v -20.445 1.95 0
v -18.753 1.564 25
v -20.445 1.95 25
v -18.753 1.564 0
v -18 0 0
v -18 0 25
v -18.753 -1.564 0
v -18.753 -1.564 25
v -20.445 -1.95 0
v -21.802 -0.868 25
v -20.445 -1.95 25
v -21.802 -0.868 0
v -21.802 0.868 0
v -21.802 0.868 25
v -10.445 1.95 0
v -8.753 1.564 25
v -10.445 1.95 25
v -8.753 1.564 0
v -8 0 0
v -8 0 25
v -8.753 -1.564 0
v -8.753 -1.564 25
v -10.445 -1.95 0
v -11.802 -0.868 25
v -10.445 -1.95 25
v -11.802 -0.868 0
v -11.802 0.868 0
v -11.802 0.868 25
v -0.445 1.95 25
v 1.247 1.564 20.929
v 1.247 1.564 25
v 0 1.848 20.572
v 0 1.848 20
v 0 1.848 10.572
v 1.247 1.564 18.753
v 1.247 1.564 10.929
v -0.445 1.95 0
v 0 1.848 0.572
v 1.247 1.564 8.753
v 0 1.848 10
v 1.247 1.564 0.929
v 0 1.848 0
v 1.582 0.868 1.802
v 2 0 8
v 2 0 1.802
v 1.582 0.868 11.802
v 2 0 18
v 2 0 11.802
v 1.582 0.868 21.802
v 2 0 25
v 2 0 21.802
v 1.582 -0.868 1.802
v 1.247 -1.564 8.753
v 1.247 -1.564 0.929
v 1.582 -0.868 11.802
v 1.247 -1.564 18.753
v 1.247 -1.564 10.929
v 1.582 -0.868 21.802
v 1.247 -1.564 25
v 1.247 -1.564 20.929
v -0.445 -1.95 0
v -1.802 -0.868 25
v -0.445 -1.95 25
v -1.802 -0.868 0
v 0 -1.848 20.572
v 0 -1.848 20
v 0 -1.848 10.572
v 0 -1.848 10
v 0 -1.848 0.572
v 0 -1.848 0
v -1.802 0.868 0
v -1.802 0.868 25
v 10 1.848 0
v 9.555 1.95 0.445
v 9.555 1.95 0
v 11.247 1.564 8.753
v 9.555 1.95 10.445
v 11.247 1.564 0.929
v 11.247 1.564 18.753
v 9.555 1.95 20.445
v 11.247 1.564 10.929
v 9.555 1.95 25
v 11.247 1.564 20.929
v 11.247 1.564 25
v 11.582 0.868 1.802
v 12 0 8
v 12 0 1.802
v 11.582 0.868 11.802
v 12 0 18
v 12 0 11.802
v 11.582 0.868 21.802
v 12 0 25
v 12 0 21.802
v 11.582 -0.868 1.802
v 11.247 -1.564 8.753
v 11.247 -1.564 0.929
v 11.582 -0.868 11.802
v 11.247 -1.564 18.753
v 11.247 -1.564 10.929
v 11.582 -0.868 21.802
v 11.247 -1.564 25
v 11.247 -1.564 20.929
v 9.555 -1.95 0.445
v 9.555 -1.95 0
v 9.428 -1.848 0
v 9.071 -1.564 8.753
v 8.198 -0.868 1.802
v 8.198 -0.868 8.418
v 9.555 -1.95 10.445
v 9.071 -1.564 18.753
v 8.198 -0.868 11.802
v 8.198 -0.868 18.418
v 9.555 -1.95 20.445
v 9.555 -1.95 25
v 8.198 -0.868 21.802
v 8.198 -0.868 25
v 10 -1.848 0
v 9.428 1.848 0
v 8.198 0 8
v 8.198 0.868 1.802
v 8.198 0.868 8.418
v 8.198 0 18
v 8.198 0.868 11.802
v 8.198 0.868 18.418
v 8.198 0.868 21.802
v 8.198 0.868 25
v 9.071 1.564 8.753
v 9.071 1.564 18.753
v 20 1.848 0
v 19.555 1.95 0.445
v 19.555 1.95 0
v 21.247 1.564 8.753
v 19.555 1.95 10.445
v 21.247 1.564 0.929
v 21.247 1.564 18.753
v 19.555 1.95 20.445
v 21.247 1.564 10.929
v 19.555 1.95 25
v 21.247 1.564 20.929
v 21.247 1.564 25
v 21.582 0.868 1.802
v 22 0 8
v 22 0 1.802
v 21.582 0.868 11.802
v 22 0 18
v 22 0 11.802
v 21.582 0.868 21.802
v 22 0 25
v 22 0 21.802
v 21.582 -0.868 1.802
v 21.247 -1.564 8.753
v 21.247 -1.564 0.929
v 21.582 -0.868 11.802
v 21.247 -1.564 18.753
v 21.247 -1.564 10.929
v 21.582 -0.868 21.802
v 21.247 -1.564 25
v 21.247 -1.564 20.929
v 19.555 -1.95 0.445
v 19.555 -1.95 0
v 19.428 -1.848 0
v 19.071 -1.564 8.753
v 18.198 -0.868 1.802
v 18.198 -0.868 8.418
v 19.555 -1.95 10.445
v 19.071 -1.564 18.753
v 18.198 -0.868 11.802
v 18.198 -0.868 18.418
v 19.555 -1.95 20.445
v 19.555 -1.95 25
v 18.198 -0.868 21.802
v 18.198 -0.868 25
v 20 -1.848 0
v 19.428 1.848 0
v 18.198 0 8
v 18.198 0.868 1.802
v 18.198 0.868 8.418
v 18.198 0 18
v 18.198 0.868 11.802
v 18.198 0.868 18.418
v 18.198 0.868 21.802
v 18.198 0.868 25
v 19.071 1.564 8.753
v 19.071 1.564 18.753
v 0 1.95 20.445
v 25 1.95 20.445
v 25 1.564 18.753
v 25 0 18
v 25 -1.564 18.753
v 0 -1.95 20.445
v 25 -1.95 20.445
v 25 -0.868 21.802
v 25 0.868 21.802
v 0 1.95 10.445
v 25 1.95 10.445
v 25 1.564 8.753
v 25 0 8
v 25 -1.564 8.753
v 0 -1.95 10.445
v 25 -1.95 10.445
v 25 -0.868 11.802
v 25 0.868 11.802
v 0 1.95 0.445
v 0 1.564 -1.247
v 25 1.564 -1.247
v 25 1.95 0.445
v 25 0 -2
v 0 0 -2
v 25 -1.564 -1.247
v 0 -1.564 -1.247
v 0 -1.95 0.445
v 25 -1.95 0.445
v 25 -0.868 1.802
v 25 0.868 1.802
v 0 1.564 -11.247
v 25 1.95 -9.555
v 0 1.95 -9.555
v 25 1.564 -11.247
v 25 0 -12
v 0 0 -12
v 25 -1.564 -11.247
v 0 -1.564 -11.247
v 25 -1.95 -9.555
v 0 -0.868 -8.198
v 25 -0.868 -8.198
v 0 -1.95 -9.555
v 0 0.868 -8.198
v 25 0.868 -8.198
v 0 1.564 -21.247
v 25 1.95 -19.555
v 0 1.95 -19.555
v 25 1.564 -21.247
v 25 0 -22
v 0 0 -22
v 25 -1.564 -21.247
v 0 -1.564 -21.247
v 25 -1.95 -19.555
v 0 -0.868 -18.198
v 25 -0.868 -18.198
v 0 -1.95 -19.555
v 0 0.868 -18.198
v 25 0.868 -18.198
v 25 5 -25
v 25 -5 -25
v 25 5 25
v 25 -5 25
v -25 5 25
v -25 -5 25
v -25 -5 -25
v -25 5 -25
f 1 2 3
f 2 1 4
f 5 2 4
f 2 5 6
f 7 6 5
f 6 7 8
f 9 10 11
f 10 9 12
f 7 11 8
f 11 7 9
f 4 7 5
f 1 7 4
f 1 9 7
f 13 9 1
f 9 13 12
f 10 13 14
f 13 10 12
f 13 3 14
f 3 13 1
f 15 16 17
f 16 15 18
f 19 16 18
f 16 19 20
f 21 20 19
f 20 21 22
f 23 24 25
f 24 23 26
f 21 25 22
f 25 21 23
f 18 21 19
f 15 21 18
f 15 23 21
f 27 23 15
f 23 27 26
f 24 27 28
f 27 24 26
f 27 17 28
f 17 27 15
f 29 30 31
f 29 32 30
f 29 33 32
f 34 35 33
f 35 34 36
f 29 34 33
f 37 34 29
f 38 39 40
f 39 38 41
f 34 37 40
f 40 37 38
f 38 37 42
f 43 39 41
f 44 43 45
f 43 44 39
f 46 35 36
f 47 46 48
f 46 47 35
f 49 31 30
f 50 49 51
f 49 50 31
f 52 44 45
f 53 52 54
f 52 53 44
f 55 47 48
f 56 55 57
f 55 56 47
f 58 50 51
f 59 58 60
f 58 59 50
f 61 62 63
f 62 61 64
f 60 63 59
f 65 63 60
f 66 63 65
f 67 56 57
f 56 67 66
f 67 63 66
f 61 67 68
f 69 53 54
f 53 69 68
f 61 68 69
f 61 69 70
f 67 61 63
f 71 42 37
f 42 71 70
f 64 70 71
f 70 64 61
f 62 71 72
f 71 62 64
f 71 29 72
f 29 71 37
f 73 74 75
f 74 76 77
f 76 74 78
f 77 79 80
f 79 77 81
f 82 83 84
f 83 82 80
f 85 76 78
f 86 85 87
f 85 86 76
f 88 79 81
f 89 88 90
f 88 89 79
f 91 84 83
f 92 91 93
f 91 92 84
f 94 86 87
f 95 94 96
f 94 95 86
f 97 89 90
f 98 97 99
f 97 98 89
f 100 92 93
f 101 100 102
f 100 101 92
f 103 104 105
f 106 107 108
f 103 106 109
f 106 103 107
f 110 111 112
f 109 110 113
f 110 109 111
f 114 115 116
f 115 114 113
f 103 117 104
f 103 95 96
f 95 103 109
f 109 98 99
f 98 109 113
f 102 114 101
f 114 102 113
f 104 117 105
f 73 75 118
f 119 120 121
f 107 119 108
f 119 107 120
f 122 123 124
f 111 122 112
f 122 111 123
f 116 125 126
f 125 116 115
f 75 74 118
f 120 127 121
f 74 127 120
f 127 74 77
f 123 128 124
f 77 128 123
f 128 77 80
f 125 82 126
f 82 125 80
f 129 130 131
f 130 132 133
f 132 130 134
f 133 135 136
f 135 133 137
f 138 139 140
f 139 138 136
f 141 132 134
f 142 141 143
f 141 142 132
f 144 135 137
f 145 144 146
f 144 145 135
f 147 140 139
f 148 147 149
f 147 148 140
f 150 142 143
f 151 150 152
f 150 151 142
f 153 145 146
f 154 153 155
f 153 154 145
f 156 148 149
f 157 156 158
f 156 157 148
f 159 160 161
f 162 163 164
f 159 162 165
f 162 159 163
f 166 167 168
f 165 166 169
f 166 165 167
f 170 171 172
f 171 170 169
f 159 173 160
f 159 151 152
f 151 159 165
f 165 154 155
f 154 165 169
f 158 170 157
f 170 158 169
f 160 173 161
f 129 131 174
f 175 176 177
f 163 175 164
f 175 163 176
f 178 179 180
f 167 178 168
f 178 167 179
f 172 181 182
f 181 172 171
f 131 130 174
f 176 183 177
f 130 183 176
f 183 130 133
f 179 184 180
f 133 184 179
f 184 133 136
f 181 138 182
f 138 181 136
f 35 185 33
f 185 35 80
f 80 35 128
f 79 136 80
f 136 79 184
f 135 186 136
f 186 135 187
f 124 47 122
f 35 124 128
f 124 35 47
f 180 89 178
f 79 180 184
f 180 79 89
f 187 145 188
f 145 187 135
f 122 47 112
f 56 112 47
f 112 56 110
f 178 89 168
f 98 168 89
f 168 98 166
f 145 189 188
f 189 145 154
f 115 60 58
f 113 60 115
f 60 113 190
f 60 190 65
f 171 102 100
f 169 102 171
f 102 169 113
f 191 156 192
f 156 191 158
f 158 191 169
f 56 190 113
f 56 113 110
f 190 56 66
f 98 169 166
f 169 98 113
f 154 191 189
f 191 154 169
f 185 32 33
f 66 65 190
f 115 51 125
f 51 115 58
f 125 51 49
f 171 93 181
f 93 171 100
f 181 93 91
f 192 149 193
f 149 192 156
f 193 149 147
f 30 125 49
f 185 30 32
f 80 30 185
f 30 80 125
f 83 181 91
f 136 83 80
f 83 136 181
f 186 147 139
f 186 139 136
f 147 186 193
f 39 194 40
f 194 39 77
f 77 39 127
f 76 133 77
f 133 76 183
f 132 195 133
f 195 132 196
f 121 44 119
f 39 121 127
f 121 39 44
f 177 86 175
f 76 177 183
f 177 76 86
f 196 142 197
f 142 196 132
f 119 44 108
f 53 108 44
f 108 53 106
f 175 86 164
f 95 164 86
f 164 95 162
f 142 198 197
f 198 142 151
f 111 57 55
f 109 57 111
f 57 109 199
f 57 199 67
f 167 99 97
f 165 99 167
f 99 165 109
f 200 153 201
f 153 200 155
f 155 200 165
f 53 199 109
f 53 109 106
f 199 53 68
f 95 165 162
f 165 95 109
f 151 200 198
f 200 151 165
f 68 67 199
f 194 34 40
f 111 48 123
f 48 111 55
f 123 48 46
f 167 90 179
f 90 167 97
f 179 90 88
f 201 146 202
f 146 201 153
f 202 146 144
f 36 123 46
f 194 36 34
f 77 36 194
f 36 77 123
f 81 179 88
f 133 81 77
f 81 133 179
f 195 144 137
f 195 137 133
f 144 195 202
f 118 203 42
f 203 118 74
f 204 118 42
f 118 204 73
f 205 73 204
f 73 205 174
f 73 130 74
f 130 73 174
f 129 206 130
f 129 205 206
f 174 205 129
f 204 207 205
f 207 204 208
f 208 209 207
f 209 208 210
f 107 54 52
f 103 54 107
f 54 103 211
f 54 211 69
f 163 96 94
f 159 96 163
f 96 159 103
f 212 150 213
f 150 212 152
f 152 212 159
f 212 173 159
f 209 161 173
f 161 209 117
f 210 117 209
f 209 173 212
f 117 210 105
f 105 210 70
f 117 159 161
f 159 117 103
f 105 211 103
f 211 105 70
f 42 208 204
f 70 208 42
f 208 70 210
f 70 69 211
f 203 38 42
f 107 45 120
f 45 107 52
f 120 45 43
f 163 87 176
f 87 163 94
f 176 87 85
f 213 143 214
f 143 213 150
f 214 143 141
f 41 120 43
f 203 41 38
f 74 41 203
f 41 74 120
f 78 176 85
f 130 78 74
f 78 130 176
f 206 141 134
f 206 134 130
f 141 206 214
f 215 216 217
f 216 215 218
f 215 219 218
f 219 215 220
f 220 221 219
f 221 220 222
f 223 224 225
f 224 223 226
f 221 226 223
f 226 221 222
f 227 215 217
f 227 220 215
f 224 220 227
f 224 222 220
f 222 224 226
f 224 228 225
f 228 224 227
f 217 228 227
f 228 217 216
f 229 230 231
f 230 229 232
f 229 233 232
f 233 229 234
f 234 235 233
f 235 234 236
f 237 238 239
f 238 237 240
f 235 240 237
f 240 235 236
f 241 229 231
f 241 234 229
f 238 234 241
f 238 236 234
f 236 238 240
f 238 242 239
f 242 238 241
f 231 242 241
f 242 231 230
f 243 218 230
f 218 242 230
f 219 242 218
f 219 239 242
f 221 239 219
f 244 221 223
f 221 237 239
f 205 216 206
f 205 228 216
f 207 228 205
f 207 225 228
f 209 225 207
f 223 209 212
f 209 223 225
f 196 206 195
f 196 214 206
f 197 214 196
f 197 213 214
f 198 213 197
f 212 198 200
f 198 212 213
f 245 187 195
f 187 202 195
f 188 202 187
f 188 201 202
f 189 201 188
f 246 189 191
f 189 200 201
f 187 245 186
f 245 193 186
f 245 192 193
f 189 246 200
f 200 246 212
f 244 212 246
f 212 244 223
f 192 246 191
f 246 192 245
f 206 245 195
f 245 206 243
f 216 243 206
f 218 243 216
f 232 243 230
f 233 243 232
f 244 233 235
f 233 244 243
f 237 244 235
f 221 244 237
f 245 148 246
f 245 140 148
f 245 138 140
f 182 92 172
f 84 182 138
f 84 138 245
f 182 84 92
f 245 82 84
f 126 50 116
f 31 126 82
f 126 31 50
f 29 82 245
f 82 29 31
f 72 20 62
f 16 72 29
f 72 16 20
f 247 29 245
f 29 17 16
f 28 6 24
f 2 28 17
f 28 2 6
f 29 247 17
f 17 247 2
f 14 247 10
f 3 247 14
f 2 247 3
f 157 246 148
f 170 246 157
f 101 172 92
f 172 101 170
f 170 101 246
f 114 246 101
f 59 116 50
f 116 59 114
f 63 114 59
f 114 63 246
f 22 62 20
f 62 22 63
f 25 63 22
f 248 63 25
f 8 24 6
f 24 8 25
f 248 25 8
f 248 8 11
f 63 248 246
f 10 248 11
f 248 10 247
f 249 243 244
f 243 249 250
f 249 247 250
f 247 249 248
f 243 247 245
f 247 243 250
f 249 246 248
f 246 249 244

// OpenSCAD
module heatsink(size, offset) {
	difference() {
		cube([size, 10, size], center=true);
		union(){
			for (rot=[0, 90]){
				rotate([0, rot, 0])
					for (dist=[(-2*offset), -offset, 0, offset, (2*offset)]){
						translate([dist, 0, 0])
      					cylinder(h=size, r=2, centre = true);
					}
         }
      }
	}
}

heatsink(50, 10);
